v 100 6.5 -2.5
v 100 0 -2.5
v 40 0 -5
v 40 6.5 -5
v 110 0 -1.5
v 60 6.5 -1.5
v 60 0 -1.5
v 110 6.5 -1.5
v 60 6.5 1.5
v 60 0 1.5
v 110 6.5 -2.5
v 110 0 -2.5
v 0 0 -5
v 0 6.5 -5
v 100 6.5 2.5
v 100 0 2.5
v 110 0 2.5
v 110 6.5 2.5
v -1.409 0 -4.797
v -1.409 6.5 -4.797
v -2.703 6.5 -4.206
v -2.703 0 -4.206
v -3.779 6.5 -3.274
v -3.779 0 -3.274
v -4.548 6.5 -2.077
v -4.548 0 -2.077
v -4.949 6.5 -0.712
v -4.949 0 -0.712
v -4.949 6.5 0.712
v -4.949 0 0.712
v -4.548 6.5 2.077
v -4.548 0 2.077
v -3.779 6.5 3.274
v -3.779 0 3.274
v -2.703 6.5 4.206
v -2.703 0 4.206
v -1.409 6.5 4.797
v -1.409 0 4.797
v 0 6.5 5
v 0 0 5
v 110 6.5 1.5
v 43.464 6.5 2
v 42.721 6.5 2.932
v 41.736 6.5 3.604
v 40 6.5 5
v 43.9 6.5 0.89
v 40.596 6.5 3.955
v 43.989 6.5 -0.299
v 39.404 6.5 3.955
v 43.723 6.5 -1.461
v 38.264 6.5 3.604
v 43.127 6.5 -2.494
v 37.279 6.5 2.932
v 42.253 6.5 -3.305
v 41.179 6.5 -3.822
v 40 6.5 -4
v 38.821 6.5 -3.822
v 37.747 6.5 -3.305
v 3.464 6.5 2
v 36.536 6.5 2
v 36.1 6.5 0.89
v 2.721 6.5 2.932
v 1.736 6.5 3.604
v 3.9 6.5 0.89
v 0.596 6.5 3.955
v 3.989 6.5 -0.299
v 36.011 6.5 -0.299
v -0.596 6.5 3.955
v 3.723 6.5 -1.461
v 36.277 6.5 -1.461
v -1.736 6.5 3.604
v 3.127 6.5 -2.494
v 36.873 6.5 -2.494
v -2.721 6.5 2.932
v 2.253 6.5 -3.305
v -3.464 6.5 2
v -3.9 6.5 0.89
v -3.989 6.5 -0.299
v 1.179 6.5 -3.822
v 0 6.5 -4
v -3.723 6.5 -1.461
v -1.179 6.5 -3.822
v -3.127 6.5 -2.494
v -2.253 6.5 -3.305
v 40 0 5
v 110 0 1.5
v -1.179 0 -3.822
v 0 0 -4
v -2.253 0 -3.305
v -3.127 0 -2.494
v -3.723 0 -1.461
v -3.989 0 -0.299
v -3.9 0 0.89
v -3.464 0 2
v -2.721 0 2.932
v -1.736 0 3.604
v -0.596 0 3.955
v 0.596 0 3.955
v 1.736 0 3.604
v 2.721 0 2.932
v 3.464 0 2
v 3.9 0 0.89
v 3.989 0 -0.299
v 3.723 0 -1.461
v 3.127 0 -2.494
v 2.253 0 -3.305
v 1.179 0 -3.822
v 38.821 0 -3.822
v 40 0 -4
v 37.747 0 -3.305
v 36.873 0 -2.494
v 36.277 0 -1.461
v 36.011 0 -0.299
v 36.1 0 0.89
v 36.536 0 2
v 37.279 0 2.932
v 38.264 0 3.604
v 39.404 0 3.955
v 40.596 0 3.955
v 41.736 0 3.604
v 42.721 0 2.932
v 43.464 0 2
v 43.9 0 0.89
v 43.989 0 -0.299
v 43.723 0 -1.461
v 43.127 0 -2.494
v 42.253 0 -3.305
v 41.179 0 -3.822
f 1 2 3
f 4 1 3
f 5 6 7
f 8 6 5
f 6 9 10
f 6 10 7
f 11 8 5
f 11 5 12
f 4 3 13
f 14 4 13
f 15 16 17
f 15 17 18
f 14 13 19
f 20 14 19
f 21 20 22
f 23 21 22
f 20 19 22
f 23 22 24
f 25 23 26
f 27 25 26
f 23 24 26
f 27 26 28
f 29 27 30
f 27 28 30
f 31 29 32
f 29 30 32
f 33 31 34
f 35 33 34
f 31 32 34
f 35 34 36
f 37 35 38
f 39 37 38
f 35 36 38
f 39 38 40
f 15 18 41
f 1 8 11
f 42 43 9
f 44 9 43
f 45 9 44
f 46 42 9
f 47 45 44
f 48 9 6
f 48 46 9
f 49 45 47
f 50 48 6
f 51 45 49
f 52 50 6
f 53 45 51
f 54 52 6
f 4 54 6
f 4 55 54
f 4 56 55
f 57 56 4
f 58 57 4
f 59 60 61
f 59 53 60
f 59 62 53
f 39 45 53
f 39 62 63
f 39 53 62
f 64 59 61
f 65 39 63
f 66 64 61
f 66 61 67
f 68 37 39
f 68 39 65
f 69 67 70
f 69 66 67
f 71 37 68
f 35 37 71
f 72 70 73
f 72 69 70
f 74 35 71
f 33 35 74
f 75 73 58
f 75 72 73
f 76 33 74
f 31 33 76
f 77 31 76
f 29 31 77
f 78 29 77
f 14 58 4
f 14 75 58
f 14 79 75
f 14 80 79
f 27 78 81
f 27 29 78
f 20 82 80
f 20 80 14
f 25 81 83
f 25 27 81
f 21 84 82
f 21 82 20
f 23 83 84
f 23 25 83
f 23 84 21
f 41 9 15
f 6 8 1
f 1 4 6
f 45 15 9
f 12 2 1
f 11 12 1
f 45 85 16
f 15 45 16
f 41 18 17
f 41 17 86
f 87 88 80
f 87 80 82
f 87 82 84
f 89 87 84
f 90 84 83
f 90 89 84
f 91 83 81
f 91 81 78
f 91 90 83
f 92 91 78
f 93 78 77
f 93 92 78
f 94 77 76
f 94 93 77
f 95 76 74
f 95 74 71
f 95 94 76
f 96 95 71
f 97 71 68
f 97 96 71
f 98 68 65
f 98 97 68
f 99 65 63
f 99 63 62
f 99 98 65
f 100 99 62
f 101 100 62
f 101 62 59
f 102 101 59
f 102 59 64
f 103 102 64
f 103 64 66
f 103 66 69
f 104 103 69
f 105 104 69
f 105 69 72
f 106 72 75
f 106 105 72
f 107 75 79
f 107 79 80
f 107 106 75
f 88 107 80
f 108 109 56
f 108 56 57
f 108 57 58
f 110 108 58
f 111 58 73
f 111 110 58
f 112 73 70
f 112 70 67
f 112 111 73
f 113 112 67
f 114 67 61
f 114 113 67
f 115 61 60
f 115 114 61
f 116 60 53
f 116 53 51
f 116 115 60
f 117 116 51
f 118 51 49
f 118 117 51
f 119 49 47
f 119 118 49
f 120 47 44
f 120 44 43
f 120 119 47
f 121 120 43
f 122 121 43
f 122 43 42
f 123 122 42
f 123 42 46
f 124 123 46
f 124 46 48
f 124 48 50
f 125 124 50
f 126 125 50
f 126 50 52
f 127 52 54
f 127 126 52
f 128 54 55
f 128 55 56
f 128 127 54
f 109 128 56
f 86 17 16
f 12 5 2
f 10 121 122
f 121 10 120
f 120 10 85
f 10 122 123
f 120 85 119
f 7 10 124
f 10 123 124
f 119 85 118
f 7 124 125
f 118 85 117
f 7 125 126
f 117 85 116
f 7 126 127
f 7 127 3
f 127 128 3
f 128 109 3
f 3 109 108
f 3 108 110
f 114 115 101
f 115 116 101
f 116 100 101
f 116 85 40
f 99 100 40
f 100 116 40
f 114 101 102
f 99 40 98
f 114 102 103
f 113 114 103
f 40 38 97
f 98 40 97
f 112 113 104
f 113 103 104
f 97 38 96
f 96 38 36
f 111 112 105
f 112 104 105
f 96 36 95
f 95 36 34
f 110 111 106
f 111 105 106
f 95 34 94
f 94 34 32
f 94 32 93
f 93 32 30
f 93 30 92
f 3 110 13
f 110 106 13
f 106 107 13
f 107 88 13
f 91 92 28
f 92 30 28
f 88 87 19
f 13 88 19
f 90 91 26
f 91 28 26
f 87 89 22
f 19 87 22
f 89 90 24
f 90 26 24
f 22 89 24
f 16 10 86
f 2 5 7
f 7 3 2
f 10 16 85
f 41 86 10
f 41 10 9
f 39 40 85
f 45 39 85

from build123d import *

# Parameters (mm, degrees)
SKETCH_1_R          = 4
EXTRUDE_1_DEPTH     = 6.5
SKETCH_2_W          = 40
SKETCH_2_H          = 3
CUT_EXTRUDE_1_DEPTH = 101.335686573
SKETCH_3_W          = 1
SKETCH_3_H          = 6.5
EXTRUDE_2_DEPTH     = 10


with BuildPart() as part:
    # 草图1 → 凸台-拉伸1 (new body)
    with BuildSketch(Plane(origin=(0, 0, 0), x_dir=(1, 0, 0), z_dir=(0, 1, 0))):
        with BuildLine():
            ThreePointArc((0, 5), (-5, 0), (0, -5))
            Line((0, -5), (40, -5))
            Line((40, -5), (100, -2.5))
            Line((100, -2.5), (100, 2.5))
            Line((100, 2.5), (40, 5))
            Line((40, 5), (0, 5))
        make_face()
        with Locations(Location((0, 0, 0), (0, 0, 90))):
            Circle(SKETCH_1_R, mode=Mode.SUBTRACT)
        with Locations(Location((40, 0, 0), (0, 0, 90))):
            Circle(SKETCH_1_R, mode=Mode.SUBTRACT)
    extrude(amount=EXTRUDE_1_DEPTH)

    # 草图2 → 切除-拉伸1 (cut, through all)
    with BuildSketch(Plane(origin=(0, 6.5, 0), x_dir=(1, 0, 0), z_dir=(0, 1, 0))):
        with Locations((80, 0)):
            Rectangle(SKETCH_2_W, SKETCH_2_H)
    extrude(amount=-CUT_EXTRUDE_1_DEPTH, mode=Mode.SUBTRACT)

    # 草图3 → 凸台-拉伸2 (add)
    with BuildSketch(Plane(origin=(100, 0, 0), x_dir=(0, 0, -1), z_dir=(1, 0, 0))):
        with Locations((-2, 3.25)):
            Rectangle(SKETCH_3_W, SKETCH_3_H)
        with Locations((2, 3.25)):
            Rectangle(SKETCH_3_W, SKETCH_3_H)
    extrude(amount=EXTRUDE_2_DEPTH)


solid = part.part
